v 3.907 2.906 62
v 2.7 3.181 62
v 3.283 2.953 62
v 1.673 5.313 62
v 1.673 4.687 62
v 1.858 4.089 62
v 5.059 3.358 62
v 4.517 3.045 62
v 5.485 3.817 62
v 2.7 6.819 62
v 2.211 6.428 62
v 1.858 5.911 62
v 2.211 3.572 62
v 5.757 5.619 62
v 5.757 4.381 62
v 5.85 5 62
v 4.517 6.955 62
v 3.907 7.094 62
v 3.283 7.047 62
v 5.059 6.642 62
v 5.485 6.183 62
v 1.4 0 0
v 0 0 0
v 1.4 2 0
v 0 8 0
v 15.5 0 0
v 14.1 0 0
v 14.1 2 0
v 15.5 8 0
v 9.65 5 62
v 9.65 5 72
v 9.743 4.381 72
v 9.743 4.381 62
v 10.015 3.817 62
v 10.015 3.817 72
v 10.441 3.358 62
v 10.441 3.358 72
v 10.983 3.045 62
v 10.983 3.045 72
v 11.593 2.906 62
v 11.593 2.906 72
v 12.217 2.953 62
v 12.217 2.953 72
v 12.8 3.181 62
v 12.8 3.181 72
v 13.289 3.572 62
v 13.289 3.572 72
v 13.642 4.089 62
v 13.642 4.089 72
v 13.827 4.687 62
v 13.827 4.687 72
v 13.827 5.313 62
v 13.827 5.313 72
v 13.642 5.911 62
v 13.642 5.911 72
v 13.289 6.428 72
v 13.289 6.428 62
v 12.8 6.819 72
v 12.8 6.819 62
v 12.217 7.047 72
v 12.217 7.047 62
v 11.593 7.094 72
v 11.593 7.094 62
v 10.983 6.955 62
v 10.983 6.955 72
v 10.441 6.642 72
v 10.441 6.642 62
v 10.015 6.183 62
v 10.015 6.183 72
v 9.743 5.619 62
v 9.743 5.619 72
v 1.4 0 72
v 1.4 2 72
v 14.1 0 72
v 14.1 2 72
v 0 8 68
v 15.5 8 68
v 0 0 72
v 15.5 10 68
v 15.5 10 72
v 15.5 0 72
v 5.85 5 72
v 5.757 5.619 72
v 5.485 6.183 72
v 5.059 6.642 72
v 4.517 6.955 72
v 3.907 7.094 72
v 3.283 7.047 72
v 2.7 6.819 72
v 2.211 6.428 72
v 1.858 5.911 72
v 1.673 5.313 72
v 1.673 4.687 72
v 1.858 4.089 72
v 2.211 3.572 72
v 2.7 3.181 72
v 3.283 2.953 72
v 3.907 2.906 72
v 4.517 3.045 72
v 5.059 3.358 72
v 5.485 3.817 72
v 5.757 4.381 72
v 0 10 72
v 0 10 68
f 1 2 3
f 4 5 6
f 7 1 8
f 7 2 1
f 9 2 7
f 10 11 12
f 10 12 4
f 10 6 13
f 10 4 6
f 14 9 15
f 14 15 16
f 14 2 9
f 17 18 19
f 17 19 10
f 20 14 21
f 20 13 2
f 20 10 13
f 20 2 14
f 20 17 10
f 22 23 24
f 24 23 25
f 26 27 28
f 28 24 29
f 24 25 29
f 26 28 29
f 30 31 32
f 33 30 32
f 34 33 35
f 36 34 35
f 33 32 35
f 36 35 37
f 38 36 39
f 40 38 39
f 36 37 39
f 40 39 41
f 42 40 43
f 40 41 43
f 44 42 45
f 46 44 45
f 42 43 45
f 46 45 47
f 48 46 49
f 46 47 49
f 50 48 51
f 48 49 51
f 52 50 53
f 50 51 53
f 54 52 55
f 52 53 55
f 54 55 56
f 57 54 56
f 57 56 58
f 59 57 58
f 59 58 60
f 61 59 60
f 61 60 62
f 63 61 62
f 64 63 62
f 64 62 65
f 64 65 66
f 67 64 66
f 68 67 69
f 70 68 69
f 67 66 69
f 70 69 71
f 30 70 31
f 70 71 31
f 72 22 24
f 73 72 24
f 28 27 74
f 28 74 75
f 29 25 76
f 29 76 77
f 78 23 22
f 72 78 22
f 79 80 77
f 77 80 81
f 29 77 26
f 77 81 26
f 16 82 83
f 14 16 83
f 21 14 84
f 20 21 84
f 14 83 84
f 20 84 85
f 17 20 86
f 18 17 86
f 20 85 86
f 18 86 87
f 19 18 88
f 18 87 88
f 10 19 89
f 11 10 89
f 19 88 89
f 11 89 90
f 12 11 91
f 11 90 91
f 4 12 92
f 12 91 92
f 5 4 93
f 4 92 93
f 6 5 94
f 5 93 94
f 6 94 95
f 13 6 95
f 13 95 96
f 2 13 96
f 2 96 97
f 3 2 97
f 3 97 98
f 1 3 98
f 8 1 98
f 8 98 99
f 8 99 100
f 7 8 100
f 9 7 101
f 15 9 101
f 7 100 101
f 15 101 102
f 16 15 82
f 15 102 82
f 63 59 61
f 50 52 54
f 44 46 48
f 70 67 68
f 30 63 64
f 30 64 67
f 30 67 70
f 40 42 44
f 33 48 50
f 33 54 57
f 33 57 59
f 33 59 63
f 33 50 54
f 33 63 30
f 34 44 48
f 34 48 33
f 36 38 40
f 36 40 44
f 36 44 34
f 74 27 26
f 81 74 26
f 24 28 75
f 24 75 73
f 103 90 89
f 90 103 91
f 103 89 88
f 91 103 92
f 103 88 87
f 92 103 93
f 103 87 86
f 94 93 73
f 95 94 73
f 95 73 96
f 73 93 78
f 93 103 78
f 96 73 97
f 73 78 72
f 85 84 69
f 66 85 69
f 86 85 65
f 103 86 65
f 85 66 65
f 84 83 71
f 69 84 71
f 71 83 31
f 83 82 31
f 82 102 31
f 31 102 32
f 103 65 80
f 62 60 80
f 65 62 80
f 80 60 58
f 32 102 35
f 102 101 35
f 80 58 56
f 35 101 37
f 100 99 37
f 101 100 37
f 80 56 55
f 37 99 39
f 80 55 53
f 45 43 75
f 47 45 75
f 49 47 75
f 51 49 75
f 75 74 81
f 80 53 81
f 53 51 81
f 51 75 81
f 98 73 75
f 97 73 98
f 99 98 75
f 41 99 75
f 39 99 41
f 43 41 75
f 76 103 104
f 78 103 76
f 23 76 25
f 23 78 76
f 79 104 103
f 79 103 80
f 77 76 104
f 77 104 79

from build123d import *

# Parameters (mm, degrees)
SKETCH_1_W          = 15.5
SKETCH_1_H          = 8
EXTRUDE_1_DEPTH     = 72
SKETCH_2_W          = 12.7
SKETCH_2_H          = 2
CUT_EXTRUDE_1_DEPTH = 75.082724032
SKETCH_3_W          = 15.5
SKETCH_3_H          = 4
EXTRUDE_2_DEPTH     = 2
SKETCH_5_R          = 2.1
CUT_EXTRUDE_3_DEPTH = 10


with BuildPart() as part:
    # 草图1 → 凸台-拉伸1 (new body)
    with BuildSketch(Plane.XY):
        with Locations((7.75, 4)):
            Rectangle(SKETCH_1_W, SKETCH_1_H)
    extrude(amount=EXTRUDE_1_DEPTH)

    # 草图2 → 切除-拉伸1 (cut, through all)
    with BuildSketch(Plane(origin=(0, 0, 0), x_dir=(-1, 0, 0), z_dir=(0, 0, -1))):
        with Locations((-7.75, 1)):
            Rectangle(SKETCH_2_W, SKETCH_2_H)
    extrude(amount=-CUT_EXTRUDE_1_DEPTH, mode=Mode.SUBTRACT)

    # 草图3 → 凸台-拉伸2 (add)
    with BuildSketch(Plane(origin=(0, 8, 0), x_dir=(1, 0, 0), z_dir=(0, 1, 0))):
        with Locations((7.75, -70)):
            Rectangle(SKETCH_3_W, SKETCH_3_H)
    extrude(amount=EXTRUDE_2_DEPTH)

    # 草图5 → 切除-拉伸3 (cut)
    with BuildSketch(Plane.XY.offset(72)):
        with Locations((3.75, 5)):
            Circle(SKETCH_5_R)
        with Locations(Location((11.75, 5, 0), (0, 0, 180))):
            Circle(SKETCH_5_R)
    extrude(amount=-CUT_EXTRUDE_3_DEPTH, mode=Mode.SUBTRACT)


solid = part.part
